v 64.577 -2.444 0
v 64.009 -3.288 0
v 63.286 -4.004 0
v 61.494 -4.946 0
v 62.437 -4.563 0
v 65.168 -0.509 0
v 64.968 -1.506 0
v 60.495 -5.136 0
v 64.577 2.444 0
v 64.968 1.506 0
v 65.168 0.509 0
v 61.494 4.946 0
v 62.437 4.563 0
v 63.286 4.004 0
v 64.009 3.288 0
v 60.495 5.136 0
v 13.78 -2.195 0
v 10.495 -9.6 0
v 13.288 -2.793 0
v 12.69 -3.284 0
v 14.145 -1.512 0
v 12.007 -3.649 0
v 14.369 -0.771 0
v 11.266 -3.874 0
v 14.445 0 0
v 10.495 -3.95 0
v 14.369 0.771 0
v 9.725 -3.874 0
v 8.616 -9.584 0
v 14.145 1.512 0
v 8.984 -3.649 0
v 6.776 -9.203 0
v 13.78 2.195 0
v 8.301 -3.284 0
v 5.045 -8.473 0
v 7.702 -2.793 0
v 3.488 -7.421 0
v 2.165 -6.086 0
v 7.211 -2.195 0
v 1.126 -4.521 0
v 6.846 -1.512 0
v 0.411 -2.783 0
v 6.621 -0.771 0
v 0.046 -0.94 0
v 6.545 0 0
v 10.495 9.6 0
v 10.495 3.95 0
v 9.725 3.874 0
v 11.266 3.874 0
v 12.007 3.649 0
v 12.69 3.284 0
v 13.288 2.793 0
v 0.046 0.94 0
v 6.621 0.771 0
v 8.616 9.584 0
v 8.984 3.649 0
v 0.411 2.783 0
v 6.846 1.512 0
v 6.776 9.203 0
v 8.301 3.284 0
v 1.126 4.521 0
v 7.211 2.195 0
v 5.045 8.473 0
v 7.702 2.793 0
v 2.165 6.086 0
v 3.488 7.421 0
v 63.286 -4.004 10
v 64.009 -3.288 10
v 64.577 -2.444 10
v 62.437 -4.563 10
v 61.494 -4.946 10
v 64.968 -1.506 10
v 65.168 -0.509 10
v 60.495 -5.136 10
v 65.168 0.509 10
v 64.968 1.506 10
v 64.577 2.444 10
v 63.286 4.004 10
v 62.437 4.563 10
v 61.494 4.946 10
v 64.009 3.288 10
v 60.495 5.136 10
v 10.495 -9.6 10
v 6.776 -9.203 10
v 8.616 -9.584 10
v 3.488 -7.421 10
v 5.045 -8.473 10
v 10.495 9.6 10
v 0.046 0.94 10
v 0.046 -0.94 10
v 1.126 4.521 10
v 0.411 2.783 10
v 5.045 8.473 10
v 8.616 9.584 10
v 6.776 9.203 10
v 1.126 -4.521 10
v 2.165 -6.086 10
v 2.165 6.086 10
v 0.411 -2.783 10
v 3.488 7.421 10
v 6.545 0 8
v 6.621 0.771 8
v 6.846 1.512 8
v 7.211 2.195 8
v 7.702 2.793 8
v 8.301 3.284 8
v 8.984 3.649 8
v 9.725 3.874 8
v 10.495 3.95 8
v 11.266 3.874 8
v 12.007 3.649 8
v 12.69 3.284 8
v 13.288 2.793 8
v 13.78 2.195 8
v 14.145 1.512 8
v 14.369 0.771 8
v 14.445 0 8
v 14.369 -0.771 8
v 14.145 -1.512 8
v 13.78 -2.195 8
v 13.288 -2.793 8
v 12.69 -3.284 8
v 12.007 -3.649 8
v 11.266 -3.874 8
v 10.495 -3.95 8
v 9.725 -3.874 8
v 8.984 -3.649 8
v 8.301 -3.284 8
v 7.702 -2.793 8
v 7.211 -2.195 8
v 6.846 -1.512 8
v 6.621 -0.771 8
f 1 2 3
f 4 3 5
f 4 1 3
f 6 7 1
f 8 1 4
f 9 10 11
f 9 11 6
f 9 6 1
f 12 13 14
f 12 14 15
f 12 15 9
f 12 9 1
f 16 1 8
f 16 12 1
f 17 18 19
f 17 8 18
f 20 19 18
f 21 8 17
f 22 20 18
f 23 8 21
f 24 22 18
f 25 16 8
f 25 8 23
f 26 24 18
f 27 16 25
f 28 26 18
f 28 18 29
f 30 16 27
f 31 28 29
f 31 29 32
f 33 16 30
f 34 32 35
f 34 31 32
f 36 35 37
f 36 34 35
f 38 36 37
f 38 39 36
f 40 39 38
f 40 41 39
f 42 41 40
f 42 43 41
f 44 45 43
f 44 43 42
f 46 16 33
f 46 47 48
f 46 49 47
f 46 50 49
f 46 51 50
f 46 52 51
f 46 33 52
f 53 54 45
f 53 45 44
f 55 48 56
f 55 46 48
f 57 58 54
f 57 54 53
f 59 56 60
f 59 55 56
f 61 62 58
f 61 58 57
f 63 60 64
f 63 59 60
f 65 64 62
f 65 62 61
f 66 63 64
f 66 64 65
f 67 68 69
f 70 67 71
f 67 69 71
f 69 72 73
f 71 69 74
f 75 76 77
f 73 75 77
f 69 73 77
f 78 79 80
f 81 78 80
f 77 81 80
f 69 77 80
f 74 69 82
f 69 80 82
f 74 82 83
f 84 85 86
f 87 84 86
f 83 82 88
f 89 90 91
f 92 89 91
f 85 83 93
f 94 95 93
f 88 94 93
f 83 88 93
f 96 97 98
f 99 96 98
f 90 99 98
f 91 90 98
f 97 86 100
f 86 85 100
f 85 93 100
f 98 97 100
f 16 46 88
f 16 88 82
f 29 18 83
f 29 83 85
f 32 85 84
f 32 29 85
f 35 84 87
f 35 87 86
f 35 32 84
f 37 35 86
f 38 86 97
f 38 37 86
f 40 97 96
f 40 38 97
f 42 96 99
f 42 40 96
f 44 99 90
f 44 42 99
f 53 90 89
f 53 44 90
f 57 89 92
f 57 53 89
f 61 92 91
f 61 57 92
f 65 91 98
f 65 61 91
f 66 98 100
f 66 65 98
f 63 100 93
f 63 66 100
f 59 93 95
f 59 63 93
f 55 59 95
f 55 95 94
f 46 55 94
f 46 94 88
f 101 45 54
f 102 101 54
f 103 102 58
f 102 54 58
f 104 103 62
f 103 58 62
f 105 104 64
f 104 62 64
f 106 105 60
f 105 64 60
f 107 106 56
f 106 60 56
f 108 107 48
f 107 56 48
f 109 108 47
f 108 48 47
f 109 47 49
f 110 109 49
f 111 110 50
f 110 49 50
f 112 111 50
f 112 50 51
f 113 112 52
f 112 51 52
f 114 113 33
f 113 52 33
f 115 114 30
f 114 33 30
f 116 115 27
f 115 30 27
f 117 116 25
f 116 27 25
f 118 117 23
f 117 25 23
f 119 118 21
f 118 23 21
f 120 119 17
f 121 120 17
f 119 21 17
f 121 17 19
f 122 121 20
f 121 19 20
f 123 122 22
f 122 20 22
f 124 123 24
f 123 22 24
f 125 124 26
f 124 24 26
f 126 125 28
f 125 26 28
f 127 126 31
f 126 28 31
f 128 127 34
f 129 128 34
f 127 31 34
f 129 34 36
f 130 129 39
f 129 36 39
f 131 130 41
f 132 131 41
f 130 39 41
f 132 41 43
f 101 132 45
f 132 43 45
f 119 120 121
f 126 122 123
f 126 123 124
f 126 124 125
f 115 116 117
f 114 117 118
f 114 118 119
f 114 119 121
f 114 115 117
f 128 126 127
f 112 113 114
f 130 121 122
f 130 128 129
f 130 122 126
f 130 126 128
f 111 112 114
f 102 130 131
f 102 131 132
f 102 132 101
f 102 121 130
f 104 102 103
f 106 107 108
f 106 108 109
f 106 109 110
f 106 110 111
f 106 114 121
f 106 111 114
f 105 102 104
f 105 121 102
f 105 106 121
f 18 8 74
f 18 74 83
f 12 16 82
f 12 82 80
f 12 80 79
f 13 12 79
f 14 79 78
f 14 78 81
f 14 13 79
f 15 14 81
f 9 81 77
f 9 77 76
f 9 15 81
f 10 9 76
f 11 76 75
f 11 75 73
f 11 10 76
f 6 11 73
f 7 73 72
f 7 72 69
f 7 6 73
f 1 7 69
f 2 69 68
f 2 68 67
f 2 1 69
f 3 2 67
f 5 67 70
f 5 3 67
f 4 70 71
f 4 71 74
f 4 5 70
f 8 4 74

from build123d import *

# Parameters (mm, degrees)
BOSS_EXTRU_1_DEPTH = 10
SKETCH1_R          = 3.95
CUT_EXTRUDE1_DEPTH = 8


with BuildPart() as part:
    # Esquisse1 → Boss.-Extru.1 (new body)
    with BuildSketch(Plane.XY):
        with BuildLine():
            Line((10.495334687, 9.6), (60.495334687, 5.135702408))
            ThreePointArc((60.495334687, 5.135702408), (65.192921242, 0), (60.495334687, -5.135702408))
            Line((60.495334687, -5.135702408), (10.495334687, -9.6))
            ThreePointArc((10.495334687, -9.6), (0, 0), (10.495334687, 9.6))
        make_face()
    extrude(amount=BOSS_EXTRU_1_DEPTH)

    # Sketch1 → Cut-Extrude1 (cut)
    with BuildSketch(Plane(origin=(0, 0, 0), x_dir=(-1, 0, 0), z_dir=(0, 0, -1))):
        with Locations((-10.495334687, 0)):
            Circle(SKETCH1_R)
    extrude(amount=-CUT_EXTRUDE1_DEPTH, mode=Mode.SUBTRACT)


solid = part.part
